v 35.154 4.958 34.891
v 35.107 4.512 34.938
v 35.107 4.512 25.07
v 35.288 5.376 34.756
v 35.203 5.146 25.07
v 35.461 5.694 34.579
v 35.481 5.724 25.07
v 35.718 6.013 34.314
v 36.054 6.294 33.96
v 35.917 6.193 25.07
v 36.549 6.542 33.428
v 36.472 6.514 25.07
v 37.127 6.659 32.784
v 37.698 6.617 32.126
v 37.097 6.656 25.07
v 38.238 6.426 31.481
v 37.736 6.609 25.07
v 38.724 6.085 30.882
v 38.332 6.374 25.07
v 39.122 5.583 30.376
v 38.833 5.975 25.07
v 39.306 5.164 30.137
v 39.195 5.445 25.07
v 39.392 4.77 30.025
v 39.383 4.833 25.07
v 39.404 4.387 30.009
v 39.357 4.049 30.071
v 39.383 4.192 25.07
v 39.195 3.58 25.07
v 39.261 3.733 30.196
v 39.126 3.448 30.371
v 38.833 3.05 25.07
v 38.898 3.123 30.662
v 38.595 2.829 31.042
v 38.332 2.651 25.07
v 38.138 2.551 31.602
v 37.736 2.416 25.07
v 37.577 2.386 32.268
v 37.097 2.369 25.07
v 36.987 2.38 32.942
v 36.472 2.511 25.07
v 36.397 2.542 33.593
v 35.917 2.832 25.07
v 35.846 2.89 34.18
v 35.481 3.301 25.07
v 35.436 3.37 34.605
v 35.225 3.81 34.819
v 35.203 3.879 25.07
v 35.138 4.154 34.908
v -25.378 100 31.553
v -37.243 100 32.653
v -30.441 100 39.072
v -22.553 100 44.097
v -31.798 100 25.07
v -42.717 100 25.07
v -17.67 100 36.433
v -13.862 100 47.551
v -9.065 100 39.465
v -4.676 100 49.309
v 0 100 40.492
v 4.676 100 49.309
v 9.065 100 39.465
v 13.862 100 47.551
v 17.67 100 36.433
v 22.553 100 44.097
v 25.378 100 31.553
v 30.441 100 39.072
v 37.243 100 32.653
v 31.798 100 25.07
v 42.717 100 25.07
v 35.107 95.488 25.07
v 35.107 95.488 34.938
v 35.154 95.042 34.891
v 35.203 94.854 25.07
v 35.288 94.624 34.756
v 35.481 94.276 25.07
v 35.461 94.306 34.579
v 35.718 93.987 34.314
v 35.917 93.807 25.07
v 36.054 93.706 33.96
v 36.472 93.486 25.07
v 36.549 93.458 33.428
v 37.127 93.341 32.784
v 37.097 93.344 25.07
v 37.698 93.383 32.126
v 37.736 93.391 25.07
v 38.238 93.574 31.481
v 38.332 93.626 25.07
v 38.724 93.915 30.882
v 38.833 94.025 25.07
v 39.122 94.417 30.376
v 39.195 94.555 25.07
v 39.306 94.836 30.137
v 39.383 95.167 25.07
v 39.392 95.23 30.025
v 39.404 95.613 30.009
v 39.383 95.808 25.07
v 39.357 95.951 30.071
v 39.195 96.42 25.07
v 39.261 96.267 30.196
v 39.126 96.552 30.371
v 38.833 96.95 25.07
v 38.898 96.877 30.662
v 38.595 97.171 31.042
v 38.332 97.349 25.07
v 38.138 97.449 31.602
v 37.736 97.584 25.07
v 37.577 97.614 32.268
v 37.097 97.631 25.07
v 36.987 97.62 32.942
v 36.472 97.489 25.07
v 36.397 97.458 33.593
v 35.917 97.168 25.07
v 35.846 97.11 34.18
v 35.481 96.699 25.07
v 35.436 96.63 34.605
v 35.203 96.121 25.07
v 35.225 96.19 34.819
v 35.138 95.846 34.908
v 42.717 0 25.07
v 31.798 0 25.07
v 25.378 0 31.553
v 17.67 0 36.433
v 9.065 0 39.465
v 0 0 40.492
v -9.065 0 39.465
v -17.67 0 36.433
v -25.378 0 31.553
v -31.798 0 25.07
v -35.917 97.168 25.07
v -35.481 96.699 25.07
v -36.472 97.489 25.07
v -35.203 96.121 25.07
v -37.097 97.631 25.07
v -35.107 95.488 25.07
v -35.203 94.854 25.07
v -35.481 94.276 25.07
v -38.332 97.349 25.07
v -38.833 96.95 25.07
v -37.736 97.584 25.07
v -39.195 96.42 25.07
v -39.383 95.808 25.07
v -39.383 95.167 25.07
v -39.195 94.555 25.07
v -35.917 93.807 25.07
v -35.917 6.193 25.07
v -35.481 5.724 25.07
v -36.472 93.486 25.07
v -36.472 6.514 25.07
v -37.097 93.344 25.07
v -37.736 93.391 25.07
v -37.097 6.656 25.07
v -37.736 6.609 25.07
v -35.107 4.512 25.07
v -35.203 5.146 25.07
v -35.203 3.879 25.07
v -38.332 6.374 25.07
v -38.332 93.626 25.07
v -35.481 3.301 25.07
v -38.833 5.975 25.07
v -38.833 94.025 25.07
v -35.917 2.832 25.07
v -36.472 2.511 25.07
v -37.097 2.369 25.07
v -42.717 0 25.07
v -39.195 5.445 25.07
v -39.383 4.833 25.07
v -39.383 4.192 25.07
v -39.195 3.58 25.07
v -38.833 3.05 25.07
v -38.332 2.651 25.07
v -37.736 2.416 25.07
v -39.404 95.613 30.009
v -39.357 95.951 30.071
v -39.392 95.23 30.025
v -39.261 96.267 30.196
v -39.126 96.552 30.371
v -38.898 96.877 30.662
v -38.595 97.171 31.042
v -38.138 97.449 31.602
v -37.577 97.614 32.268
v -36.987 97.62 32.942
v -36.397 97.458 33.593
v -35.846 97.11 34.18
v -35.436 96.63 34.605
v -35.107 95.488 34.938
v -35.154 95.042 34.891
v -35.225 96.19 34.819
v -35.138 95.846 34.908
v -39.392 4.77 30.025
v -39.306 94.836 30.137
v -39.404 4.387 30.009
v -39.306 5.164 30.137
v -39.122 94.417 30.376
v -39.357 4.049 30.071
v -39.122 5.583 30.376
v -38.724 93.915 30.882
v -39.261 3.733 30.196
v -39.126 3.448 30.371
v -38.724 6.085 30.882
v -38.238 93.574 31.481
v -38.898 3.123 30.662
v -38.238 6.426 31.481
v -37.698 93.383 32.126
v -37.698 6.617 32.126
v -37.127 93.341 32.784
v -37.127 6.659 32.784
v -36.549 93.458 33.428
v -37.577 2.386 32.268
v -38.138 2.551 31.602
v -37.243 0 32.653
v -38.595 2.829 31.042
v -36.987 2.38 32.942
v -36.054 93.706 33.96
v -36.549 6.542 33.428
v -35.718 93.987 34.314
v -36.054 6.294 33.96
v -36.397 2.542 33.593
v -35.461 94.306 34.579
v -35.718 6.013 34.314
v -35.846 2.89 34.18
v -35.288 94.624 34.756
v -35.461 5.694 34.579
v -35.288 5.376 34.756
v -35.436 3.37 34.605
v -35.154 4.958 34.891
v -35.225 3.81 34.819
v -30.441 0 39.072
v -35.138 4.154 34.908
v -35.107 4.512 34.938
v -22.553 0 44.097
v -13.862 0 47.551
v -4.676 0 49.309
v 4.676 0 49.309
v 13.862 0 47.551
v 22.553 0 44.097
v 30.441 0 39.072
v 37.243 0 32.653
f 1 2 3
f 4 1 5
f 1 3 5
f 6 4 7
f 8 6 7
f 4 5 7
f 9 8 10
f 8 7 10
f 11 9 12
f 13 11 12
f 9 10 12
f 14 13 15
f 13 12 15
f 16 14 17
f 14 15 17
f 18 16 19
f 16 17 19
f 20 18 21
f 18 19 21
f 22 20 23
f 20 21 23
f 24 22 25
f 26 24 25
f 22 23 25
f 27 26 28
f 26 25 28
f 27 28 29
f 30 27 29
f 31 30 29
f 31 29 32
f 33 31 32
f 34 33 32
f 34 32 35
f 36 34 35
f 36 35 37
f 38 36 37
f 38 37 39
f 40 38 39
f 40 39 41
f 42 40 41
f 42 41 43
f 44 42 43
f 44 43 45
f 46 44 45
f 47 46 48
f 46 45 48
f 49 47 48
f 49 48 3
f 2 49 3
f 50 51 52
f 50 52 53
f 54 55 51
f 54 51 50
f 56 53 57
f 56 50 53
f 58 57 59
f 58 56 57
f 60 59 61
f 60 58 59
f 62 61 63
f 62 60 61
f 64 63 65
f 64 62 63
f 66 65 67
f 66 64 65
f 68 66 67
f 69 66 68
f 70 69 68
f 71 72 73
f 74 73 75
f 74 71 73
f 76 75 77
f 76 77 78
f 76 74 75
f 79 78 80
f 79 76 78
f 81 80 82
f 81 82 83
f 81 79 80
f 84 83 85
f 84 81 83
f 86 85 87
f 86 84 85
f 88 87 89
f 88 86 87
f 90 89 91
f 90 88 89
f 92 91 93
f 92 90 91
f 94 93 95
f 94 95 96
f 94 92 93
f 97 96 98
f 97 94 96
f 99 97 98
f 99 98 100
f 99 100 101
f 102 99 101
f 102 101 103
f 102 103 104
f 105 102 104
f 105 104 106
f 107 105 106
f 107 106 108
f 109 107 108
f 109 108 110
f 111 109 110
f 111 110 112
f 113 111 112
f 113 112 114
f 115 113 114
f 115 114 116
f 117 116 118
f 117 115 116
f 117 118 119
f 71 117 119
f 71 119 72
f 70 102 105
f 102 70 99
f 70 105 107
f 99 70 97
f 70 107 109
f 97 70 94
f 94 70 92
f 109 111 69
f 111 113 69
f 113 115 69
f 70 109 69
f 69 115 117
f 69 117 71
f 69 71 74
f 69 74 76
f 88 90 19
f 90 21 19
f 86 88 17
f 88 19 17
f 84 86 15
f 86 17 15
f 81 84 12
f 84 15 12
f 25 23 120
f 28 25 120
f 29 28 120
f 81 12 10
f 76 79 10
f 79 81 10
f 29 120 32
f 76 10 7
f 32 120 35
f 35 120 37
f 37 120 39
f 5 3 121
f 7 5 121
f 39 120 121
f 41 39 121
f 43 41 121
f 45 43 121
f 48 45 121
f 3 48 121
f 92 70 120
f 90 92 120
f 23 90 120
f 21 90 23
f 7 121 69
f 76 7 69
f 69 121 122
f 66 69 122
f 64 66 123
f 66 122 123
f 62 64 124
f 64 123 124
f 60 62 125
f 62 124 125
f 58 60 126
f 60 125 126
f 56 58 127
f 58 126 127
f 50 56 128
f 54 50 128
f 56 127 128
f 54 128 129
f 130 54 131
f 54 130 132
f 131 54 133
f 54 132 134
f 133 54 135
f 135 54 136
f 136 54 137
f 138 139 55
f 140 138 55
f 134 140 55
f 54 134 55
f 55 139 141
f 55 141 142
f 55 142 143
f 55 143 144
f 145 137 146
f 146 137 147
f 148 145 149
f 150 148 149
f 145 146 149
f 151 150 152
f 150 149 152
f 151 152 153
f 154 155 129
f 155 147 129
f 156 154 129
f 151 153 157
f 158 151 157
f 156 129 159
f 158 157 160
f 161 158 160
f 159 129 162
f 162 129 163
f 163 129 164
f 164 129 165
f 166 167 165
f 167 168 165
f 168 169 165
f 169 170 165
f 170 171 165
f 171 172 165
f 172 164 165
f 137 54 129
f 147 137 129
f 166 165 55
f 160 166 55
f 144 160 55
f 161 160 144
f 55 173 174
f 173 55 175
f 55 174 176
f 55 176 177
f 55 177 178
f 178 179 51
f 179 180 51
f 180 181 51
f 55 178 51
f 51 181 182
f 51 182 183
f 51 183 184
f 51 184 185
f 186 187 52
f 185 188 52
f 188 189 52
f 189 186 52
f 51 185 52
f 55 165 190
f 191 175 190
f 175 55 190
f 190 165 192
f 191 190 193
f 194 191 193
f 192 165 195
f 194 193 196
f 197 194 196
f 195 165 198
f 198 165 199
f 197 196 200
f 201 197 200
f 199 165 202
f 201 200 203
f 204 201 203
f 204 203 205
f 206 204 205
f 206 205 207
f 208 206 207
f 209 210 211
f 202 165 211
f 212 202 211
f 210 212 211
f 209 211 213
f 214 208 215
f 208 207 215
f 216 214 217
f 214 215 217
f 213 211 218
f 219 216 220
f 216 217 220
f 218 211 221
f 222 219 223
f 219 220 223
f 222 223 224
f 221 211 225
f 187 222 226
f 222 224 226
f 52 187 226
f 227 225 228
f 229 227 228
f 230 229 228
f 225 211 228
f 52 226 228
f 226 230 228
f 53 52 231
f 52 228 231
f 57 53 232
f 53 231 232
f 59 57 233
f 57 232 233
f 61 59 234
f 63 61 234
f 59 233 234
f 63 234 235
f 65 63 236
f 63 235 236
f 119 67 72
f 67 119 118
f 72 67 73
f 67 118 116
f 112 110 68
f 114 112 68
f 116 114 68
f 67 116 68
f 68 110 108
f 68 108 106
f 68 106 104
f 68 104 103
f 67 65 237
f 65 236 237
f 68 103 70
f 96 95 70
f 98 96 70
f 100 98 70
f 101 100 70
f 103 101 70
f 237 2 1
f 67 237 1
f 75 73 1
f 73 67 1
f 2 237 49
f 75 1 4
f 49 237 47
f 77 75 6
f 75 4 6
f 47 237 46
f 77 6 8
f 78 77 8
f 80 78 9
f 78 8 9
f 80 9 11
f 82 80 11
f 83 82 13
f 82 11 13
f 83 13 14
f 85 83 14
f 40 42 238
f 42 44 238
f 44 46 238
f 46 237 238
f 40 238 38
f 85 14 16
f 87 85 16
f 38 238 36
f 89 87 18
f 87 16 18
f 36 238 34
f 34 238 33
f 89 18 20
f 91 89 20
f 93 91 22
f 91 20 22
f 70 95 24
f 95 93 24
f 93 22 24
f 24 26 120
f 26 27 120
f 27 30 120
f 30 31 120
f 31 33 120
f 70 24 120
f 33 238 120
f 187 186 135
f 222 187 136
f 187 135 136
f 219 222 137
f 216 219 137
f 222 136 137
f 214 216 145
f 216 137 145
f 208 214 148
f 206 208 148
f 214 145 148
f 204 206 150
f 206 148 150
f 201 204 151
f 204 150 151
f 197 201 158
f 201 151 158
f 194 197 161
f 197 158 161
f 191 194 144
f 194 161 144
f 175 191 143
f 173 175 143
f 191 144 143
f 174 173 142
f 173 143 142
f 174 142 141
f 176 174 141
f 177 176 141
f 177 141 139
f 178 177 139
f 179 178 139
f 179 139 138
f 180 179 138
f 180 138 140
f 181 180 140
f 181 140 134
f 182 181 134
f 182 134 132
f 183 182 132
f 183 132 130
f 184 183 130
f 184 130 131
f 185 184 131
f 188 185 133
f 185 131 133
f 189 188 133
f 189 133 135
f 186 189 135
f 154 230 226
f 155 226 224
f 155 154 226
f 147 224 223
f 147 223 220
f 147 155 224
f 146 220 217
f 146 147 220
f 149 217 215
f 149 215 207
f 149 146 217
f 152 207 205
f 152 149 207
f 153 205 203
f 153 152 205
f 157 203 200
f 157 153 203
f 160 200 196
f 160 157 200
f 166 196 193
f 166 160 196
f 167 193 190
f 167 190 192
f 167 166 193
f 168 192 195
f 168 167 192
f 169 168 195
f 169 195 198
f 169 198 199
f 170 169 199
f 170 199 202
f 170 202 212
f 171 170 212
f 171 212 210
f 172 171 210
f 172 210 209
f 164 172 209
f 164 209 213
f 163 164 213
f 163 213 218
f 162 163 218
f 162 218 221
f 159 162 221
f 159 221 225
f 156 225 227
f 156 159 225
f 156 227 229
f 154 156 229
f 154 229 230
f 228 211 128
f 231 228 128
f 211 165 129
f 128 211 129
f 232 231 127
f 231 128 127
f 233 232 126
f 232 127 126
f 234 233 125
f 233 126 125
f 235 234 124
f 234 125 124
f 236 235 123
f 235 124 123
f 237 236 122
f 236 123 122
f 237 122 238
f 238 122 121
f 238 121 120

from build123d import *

# Parameters (mm, degrees)
BOSS_EXTRUDE1_DEPTH                        = 100
SKETCH2_R                                  = 2.15
CUT_EXTRUDE1_DEPTH                         = 10
MIRROR1_AT_THE_SECOND_PLANE_COPY_1_SKETC_R = 2.15
MIRROR1_AT_THE_SECOND_PLANE_COPY_1_DEPTH   = 10


with BuildPart() as part:
    # Sketch1 → Boss-Extrude1 (new body)
    with BuildSketch(Plane(origin=(0, 0, 0), x_dir=(1, 0, 0), z_dir=(0, 1, 0))):
        with BuildLine():
            ThreePointArc((31.798147977, -25.07), (0, -40.492309328), (-31.798147977, -25.07))
            Line((-31.798147977, -25.07), (-42.716694629, -25.07))
            ThreePointArc((-42.716694629, -25.07), (0, -49.53), (42.716694629, -25.07))
            Line((42.716694629, -25.07), (31.798147977, -25.07))
        make_face()
    extrude(amount=BOSS_EXTRUDE1_DEPTH)

    # Sketch2 → Cut-Extrude1 (cut)
    with BuildSketch(Plane(origin=(0, 0, 25.07), x_dir=(-1, 0, 0), z_dir=(0, 0, -1))):
        with Locations((-37.257421303, 4.5125)):
            Circle(SKETCH2_R)
    cut_extrude1 = extrude(amount=-CUT_EXTRUDE1_DEPTH, mode=Mode.SUBTRACT)

    # Mirror1: Cut-Extrude1 across plane
    add(cut_extrude1.mirror(Plane(origin=(0, 50, 0), x_dir=(0, 0, 1), z_dir=(0, -1, 0))), mode=Mode.SUBTRACT)

    # Mirror1 at the second plane: Cut-Extrude1 across plane
    add(cut_extrude1.mirror(Plane(origin=(0, 0, 0), x_dir=(0, 0, 1), z_dir=(1, 0, 0))), mode=Mode.SUBTRACT)

    # Mirror1 at the second plane copy 1 sketc → Mirror1 at the second plane copy 1 (cut)
    with BuildSketch(Plane(origin=(0, 100, 25.07), x_dir=(1, 0, 0), z_dir=(0, 0, -1))):
        with Locations((-37.257421303, 4.5125)):
            Circle(MIRROR1_AT_THE_SECOND_PLANE_COPY_1_SKETC_R)
    extrude(amount=-MIRROR1_AT_THE_SECOND_PLANE_COPY_1_DEPTH, mode=Mode.SUBTRACT)


solid = part.part
